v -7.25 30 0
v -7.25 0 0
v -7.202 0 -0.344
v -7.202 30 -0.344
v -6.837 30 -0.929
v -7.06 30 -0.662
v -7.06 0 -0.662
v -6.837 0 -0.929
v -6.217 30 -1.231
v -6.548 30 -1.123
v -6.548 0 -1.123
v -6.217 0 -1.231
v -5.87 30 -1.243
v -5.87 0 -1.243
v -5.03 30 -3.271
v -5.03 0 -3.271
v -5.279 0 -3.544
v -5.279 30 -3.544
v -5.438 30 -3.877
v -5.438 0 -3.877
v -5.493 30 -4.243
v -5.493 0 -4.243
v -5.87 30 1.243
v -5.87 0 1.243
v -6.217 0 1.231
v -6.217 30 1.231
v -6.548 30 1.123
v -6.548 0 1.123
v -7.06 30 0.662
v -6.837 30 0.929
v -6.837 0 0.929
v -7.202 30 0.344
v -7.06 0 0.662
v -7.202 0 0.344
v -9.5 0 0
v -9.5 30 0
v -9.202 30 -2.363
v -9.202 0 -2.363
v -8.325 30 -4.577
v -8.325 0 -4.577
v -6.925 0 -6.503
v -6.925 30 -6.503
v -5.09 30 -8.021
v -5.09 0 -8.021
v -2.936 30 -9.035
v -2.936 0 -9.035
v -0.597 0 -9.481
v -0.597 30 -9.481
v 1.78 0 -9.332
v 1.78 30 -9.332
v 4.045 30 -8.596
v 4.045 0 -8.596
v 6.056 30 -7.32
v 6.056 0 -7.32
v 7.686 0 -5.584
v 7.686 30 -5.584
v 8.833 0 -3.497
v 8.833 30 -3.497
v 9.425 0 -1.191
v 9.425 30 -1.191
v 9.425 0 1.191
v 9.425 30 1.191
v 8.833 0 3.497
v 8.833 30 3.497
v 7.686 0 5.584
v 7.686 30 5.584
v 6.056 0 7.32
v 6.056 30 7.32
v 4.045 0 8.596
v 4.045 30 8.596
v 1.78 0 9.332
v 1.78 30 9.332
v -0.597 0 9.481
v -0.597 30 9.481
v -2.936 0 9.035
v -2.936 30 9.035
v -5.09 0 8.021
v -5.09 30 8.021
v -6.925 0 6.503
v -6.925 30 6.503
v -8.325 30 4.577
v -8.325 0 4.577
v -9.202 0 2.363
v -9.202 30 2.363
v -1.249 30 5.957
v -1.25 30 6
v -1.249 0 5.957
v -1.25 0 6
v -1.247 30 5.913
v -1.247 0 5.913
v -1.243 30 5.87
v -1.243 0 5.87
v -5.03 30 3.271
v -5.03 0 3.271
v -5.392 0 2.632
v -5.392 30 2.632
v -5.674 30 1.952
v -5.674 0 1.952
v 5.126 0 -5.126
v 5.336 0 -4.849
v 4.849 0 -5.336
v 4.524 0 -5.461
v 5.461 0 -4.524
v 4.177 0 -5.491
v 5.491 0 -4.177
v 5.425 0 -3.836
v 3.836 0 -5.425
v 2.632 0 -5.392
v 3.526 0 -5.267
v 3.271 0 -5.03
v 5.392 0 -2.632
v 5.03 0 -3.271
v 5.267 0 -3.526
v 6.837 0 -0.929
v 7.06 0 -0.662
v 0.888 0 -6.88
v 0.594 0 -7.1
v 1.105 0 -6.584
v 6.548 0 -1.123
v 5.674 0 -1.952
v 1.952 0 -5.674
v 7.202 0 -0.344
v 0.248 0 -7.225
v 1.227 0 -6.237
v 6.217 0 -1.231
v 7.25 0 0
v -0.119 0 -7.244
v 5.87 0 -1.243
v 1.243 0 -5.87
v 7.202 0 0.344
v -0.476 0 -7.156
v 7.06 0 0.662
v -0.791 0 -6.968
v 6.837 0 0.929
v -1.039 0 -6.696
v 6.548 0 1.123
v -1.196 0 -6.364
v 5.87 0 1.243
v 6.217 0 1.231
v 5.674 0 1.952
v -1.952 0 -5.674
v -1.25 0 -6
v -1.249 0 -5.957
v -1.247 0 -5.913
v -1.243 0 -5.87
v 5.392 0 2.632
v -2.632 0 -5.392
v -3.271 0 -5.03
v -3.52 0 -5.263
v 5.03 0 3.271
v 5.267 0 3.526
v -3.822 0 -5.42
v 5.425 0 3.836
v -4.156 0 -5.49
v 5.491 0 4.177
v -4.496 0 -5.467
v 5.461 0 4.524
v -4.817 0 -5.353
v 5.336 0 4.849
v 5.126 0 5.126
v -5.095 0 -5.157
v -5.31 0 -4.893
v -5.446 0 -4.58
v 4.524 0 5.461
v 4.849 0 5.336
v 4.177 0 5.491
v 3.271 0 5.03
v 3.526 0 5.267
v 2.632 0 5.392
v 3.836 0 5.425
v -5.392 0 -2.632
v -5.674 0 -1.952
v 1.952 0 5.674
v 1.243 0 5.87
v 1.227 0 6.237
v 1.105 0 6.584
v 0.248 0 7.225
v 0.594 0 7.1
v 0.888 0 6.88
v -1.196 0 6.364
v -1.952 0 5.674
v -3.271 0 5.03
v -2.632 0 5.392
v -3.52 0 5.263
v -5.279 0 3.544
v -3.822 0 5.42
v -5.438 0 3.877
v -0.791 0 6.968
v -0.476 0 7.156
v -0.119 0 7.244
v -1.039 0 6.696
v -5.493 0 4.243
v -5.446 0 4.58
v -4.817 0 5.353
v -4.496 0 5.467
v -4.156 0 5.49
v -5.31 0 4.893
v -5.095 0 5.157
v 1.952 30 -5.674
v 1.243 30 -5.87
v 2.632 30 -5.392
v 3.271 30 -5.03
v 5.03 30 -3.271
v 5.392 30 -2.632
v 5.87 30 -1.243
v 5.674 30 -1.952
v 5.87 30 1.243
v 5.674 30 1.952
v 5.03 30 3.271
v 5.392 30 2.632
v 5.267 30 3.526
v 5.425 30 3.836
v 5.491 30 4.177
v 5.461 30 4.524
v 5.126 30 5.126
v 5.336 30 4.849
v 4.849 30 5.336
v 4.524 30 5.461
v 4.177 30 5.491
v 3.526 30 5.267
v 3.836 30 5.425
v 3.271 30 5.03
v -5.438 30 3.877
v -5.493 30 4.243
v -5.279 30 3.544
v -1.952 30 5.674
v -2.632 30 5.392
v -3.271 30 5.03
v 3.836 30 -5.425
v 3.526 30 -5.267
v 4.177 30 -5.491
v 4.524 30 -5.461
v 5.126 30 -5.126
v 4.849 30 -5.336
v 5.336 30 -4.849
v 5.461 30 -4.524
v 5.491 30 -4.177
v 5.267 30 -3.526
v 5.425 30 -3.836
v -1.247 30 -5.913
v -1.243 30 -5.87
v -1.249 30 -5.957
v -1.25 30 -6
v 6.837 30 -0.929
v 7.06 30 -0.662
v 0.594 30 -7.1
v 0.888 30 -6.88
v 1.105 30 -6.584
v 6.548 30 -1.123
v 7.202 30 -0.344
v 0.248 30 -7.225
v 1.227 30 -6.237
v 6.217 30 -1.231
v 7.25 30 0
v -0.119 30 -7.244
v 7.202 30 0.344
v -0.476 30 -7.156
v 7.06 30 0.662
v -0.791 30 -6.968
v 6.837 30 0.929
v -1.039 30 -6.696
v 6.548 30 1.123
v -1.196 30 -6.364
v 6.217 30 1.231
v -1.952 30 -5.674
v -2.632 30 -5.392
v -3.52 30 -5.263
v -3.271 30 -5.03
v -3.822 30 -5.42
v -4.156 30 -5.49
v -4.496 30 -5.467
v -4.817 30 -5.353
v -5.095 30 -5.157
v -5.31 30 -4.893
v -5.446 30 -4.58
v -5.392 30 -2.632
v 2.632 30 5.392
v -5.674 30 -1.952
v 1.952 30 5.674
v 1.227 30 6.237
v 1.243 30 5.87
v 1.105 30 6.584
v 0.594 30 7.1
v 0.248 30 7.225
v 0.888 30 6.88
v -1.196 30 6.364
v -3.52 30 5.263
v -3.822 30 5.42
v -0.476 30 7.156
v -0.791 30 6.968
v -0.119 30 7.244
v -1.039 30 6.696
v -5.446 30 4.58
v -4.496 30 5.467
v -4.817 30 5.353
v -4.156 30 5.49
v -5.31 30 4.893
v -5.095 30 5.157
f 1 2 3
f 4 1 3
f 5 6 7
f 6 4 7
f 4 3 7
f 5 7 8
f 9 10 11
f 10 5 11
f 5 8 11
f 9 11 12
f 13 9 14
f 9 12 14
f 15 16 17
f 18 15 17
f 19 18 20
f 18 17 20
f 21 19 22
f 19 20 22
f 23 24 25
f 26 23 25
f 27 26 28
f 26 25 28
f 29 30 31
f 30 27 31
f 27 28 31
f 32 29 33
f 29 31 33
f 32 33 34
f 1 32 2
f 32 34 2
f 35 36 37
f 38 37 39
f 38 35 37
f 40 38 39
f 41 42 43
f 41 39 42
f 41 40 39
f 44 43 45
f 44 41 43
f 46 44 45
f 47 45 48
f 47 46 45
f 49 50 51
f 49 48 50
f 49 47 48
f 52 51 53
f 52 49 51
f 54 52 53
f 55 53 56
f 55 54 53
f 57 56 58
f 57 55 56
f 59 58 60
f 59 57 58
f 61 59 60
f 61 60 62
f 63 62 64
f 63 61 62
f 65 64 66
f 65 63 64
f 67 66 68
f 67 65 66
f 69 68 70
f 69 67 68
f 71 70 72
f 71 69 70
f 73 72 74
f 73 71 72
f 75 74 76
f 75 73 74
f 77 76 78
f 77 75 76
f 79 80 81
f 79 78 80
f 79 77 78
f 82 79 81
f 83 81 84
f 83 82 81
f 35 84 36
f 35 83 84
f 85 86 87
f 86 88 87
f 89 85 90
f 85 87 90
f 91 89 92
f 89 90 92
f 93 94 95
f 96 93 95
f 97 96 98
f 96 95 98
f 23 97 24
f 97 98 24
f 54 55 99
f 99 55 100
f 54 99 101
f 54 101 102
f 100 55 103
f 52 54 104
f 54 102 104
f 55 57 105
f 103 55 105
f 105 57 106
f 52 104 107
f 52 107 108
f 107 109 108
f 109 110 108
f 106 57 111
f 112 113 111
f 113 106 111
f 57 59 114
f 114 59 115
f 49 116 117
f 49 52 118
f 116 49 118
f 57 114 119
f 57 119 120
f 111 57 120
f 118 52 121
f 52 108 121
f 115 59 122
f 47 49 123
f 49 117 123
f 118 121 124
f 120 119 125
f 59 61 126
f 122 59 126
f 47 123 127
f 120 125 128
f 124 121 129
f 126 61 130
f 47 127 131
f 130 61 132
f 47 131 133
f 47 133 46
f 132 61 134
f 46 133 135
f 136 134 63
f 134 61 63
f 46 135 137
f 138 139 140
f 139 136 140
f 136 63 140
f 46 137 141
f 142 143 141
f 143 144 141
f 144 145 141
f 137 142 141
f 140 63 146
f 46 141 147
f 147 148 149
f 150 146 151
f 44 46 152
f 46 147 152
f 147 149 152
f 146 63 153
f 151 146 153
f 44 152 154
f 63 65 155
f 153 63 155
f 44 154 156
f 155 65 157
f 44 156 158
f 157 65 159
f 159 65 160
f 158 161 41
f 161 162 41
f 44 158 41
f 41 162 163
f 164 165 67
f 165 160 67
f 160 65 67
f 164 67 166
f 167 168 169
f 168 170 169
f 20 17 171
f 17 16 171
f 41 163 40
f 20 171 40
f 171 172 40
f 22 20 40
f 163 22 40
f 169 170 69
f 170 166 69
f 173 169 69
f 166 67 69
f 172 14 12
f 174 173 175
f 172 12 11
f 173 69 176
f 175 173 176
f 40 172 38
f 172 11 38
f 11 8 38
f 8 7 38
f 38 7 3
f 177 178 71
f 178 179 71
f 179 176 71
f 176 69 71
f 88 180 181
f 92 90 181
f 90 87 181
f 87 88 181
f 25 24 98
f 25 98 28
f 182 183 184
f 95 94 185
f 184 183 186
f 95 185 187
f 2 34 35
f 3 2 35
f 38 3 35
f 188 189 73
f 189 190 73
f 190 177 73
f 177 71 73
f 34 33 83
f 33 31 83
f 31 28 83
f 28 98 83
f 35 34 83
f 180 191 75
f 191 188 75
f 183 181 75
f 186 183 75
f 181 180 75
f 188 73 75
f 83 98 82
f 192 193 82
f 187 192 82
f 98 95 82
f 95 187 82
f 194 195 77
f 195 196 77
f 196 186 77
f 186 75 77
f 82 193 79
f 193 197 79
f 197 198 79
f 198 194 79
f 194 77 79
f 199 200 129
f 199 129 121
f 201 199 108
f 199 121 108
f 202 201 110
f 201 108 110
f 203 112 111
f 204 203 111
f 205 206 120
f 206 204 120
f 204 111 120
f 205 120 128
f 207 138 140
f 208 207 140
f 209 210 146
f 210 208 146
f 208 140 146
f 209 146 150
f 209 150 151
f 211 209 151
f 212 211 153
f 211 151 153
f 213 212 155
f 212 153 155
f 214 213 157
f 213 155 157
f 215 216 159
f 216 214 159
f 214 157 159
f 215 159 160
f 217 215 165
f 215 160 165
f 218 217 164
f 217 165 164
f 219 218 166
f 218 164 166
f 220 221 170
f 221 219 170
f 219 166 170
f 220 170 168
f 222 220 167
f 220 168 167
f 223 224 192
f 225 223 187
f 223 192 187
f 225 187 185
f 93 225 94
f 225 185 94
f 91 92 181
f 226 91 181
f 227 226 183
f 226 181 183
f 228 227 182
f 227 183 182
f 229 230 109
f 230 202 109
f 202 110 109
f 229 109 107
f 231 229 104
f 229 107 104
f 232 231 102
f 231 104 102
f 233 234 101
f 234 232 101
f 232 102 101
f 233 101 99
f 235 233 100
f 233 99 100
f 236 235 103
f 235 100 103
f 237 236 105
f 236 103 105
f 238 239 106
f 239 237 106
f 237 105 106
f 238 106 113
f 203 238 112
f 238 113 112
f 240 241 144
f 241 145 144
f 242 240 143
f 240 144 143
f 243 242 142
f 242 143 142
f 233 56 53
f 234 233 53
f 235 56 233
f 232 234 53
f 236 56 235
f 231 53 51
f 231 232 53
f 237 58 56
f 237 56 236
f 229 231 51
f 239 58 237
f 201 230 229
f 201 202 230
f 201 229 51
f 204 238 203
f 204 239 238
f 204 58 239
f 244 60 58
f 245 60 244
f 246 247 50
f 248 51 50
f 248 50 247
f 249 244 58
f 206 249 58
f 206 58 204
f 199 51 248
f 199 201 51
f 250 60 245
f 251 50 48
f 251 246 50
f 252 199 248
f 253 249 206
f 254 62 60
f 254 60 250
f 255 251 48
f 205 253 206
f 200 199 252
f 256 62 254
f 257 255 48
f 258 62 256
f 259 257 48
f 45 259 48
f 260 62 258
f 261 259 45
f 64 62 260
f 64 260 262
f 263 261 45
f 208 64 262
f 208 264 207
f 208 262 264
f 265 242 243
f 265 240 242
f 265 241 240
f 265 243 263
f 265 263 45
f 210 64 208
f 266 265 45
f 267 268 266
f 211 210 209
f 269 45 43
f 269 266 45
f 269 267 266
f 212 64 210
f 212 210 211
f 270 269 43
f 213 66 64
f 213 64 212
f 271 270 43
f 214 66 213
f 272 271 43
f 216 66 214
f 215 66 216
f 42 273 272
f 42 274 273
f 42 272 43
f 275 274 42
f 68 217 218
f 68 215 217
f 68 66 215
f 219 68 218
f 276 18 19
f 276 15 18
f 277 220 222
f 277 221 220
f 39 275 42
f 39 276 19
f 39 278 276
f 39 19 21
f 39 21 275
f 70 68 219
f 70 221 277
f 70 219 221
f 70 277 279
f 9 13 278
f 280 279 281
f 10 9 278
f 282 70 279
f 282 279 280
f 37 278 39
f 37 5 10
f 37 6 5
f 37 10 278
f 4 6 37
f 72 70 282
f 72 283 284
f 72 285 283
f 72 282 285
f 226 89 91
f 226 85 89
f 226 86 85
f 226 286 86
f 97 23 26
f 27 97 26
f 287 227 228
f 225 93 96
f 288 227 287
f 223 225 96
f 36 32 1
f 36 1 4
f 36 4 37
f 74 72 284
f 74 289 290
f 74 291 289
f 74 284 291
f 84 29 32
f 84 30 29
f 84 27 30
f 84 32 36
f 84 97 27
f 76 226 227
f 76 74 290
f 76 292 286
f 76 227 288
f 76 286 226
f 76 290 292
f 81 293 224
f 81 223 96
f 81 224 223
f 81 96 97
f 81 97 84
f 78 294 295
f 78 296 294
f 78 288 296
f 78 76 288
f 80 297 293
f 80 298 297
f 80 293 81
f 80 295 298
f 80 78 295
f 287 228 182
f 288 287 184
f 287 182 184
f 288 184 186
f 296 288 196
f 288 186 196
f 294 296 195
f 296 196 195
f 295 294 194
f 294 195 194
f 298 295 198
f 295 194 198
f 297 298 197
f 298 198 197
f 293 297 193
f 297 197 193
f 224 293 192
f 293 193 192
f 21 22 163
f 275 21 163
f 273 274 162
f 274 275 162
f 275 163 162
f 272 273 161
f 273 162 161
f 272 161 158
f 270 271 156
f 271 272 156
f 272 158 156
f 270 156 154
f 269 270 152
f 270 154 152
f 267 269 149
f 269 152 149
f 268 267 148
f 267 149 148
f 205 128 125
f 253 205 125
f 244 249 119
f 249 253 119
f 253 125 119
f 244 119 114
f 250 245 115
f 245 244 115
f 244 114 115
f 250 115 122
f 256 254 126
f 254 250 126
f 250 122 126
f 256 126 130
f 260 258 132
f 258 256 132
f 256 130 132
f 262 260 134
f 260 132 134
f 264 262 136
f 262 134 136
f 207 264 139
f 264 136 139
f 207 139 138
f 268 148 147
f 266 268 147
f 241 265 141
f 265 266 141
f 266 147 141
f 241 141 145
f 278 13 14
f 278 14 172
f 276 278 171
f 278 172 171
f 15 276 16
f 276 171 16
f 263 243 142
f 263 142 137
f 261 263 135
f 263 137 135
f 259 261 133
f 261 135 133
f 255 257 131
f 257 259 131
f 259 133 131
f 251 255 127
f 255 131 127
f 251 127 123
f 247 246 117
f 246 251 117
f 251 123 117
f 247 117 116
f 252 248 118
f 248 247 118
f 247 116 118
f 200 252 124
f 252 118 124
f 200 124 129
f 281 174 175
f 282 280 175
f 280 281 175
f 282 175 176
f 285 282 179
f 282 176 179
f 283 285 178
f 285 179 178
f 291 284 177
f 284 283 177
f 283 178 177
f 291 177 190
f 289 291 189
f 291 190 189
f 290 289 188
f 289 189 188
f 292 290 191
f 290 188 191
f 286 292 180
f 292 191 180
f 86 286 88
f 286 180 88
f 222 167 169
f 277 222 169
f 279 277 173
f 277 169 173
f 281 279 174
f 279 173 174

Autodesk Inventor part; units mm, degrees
ref_plane "YZ Plane" through (0, 0, 0) normal (1, 0, 0) x (0, 1, 0)
ref_plane "XZ Plane" through (0, 0, 0) normal (0, 1, 0) x (-1, 0, 0)
ref_plane "XY Plane" through (0, 0, 0) normal (0, 0, 1) x (1, 0, 0)
sketch "Sketch1" plane through (0, 0, 0) normal (0, 1, 0) x (-1, 0, 0)
  circle A0 centre (0, 0) radius 6
  circle A1 centre (0, 0) radius 9.5
  circle A2 centre (6, 0) radius 1.25
  line L0 (6, 0) -> (4.0311, 0)
  circle A3 centre (4.2426, 4.2426) radius 1.25
  circle A4 centre (0, 6) radius 1.25
  circle A5 centre (-4.2426, 4.2426) radius 1.25
  circle A6 centre (-6, 0) radius 1.25
  circle A7 centre (-4.2426, -4.2426) radius 1.25
  circle A8 centre (0, -6) radius 1.25
  circle A9 centre (4.2426, -4.2426) radius 1.25
  point P0 (5.8698, -1.2432)
  point P1 (5.8698, 1.2432)
  point P2 (5.0296, -3.2715)
  point P3 (3.2715, -5.0296)
  point P4 (1.2432, -5.8698)
  point P5 (-1.2432, -5.8698)
  point P6 (-3.2715, -5.0296)
  point P7 (-5.0296, -3.2715)
  point P8 (-5.8698, -1.2432)
  point P9 (-5.8698, 1.2432)
  point P10 (-5.0296, 3.2715)
  point P11 (-3.2715, 5.0296)
  point P12 (-1.2432, 5.8698)
  point P13 (1.2432, 5.8698)
  point P14 (3.2715, 5.0296)
  point P15 (5.0296, 3.2715)
  dimension "d1" = 12
  dimension "d0" = 19
  dimension "d2" = 2.5
  dimension "d14" = 6
  dimension "d15" = 2.25
  dimension "d18" = 360
  dimension "d20" = 4.2426
  dimension "d21" = 4.2426
  dimension "d22" = 6
extrude "Extrusion1" add sketch "Sketch1" along normal blind 30
properties part number "Bearing"
